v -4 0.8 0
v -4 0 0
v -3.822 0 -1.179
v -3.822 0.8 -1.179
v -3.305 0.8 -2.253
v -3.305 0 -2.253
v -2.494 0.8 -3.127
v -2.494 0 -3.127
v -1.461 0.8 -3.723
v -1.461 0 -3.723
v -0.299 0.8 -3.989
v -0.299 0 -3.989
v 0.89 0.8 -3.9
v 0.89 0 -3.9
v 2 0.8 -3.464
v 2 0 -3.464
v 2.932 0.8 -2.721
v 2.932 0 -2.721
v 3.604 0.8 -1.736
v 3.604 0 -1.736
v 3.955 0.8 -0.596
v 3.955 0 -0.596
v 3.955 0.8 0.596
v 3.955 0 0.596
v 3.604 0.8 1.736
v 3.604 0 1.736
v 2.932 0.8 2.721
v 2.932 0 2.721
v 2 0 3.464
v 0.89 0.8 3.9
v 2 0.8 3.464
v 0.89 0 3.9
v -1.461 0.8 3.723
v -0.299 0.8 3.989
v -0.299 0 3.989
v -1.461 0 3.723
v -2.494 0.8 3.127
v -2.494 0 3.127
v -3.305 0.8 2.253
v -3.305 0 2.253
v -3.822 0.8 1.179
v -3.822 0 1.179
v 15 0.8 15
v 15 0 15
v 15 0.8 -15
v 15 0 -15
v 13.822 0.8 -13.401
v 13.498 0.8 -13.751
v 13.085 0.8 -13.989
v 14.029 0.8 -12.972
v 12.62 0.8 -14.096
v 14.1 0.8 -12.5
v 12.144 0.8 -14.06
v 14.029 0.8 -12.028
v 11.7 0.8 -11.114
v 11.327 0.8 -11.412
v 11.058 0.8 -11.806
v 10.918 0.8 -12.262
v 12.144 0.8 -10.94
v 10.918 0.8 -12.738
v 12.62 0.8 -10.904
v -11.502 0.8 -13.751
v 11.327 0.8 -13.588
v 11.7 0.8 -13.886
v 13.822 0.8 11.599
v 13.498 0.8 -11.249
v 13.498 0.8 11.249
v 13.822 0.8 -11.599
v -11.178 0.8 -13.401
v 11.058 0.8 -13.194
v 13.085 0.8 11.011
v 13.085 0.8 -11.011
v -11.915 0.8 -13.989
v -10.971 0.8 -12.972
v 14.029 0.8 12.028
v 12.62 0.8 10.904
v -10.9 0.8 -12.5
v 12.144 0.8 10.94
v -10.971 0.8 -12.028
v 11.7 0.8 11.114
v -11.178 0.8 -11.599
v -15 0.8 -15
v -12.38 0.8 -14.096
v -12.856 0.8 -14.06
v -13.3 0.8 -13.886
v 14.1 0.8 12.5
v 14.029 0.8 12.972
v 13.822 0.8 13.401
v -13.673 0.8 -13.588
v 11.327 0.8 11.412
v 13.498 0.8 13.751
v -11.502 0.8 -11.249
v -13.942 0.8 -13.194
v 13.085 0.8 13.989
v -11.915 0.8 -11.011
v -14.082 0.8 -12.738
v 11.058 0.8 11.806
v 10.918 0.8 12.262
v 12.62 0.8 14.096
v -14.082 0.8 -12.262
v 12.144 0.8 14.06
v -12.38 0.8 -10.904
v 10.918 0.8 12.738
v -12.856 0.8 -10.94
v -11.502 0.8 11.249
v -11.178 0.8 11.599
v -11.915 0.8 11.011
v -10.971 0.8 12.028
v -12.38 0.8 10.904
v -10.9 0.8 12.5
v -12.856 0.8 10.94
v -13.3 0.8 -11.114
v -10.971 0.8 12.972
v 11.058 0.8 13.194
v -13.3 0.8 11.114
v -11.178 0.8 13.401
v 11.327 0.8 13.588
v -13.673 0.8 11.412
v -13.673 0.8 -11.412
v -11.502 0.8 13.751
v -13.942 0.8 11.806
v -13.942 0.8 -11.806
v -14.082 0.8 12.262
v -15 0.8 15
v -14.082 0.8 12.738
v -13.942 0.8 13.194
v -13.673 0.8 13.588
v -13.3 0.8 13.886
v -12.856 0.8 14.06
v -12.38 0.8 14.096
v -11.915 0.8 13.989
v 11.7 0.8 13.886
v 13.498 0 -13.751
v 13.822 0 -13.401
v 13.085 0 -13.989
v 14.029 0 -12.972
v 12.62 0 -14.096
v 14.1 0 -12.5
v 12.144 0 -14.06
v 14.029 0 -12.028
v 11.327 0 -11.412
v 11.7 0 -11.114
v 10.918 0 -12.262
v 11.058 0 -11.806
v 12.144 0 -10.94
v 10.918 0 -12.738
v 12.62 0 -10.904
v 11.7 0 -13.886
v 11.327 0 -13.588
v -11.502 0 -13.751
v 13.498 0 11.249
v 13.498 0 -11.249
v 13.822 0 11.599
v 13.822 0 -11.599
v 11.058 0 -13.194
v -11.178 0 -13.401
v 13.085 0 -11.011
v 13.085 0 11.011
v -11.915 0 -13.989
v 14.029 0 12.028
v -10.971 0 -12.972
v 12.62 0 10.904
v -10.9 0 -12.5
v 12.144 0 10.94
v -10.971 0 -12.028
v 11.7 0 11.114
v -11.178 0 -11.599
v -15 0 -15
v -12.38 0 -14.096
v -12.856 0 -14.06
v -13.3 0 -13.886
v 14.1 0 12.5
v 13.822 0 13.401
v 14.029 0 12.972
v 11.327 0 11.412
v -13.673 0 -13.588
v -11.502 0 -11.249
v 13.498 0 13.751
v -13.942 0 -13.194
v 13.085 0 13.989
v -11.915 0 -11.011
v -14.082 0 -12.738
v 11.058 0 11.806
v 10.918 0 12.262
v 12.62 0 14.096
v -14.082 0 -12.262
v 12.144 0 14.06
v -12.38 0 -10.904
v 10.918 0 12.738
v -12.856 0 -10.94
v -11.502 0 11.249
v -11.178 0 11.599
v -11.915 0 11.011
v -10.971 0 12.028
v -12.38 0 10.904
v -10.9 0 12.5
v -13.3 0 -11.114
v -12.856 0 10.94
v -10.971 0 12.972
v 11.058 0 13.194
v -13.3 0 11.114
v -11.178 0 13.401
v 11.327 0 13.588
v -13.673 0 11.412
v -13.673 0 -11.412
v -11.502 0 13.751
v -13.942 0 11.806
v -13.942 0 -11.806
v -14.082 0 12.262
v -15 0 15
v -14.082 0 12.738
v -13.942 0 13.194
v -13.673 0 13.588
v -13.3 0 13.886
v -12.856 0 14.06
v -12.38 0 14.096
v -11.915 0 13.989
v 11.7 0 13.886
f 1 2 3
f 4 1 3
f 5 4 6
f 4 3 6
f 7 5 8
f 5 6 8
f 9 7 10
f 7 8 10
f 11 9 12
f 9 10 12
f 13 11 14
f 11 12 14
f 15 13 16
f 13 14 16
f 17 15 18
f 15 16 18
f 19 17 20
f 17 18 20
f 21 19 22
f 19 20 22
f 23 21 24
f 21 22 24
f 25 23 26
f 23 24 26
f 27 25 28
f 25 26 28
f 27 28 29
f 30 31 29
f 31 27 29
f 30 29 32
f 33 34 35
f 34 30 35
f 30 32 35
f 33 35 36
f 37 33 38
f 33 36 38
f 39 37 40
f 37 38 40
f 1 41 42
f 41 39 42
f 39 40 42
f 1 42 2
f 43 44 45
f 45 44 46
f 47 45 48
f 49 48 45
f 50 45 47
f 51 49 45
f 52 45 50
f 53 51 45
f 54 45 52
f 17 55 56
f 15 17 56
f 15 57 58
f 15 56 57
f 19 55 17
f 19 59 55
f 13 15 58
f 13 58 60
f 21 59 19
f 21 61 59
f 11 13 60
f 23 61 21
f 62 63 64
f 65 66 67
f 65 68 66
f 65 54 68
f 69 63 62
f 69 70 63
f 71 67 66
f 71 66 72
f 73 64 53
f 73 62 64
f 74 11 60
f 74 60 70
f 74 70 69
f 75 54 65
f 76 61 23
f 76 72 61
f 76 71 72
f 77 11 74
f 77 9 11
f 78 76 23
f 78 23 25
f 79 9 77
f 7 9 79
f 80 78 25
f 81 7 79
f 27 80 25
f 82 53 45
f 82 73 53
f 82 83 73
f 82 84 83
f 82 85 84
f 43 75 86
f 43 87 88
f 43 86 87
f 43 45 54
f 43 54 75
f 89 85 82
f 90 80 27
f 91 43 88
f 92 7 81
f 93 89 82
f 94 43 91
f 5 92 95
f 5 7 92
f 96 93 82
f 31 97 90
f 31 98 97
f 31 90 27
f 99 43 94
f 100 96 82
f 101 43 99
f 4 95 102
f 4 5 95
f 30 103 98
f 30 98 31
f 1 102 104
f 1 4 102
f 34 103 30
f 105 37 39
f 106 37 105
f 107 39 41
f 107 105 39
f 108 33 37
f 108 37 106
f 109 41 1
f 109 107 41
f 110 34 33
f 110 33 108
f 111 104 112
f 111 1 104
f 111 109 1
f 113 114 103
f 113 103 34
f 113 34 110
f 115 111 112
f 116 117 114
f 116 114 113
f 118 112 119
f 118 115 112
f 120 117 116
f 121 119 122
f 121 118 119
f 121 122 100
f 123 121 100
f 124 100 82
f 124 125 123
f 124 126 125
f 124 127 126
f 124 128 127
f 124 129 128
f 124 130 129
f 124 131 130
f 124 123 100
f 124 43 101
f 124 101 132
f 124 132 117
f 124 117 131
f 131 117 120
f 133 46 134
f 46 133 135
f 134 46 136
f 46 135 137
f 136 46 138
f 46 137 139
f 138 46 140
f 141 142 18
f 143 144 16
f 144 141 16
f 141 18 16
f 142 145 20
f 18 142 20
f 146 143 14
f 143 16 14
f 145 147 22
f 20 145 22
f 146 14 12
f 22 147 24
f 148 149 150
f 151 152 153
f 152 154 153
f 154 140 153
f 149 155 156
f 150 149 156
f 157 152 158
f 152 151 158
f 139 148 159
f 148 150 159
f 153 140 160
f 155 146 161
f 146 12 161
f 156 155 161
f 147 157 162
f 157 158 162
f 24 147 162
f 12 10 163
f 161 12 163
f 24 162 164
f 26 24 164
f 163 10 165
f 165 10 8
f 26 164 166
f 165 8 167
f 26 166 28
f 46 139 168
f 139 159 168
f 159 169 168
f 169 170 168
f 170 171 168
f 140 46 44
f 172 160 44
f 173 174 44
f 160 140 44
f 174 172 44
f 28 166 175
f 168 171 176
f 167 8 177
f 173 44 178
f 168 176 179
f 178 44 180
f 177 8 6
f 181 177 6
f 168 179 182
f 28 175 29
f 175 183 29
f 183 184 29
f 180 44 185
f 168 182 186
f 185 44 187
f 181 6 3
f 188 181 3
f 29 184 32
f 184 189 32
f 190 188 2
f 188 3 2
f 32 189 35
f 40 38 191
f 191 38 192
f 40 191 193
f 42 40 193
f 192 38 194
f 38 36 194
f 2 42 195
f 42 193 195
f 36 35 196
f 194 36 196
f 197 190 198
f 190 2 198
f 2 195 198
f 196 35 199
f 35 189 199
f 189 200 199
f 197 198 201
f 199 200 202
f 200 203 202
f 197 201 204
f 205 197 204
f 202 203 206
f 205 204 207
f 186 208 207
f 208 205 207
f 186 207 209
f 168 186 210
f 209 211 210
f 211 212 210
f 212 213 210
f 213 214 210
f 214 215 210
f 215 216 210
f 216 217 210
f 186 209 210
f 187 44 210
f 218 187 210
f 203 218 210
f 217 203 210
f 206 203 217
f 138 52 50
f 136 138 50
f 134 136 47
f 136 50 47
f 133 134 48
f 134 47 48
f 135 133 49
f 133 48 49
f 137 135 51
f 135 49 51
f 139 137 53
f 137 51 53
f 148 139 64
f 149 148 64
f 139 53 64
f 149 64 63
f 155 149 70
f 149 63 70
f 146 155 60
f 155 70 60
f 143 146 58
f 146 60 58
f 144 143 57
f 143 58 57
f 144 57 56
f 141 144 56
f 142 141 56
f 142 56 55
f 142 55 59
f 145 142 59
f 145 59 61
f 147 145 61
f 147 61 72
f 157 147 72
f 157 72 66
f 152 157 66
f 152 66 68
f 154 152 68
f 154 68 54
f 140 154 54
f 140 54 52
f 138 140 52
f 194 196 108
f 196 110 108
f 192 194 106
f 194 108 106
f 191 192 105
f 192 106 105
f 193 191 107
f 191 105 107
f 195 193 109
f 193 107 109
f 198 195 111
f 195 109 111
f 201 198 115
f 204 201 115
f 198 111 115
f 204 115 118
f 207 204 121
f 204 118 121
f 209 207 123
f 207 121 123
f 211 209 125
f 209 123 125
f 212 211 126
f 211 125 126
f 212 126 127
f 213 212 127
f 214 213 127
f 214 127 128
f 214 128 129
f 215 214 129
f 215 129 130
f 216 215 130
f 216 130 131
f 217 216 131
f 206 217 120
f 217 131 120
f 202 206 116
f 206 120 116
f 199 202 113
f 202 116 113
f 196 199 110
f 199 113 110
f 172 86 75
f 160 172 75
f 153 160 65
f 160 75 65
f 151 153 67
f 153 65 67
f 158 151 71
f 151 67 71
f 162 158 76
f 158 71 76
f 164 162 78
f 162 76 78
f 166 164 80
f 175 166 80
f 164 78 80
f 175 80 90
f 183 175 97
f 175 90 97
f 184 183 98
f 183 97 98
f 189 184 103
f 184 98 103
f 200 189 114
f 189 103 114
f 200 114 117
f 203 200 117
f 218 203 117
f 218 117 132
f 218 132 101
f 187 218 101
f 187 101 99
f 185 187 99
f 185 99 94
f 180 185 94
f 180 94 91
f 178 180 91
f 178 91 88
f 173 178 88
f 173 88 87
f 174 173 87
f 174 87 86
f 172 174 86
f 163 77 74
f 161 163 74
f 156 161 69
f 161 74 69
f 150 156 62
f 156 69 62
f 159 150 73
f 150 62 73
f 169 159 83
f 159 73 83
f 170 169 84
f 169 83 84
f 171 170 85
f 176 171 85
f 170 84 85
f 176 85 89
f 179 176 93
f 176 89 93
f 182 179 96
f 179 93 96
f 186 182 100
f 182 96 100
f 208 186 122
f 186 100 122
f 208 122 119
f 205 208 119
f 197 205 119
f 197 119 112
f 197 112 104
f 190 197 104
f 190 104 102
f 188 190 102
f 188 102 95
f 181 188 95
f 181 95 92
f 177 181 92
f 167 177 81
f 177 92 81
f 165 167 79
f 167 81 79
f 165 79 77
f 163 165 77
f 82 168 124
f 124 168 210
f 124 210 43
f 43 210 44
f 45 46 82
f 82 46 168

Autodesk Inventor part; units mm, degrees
ref_plane "YZ Plane" through (0, 0, 0) normal (1, 0, 0) x (0, 1, 0)
ref_plane "XZ Plane" through (0, 0, 0) normal (0, 1, 0) x (-1, 0, 0)
ref_plane "XY Plane" through (0, 0, 0) normal (0, 0, 1) x (1, 0, 0)
sketch "スケッチ1" plane through (0, 0, 0) normal (0, 1, 0) x (-1, 0, 0)
  line L0 (-15, -15) -> (15, -15)
  line L1 (15, -15) -> (15, 15)
  line L2 (15, 15) -> (-15, 15)
  line L3 (-15, 15) -> (-15, -15)
  line L4 (-15, -15) -> (15, 15) construction
  line L5 (15, -15) -> (-15, 15) construction
  circle A0 centre (0, 0) radius 4
  dimension "d0" = 30
  dimension "d1" = 30
  dimension "d2" = 8
extrude "押し出し1" add sketch "スケッチ1" along normal blind 0.8
sketch "スケッチ2" plane through (0, 0.8, 0) normal (0, 1, 0) x (1, 0, 0)
  circle A0 centre (-12.5, -12.5) radius 1.6
  line L0 (0, -18.82) -> (0, 21.247)
  line L1 (-16.0432, 0) -> (16.9483, 0)
  circle A1 centre (-12.5, 12.5) radius 1.6
  circle A2 centre (12.5, -12.5) radius 1.6
  circle A3 centre (12.5, 12.5) radius 1.6
  line L2 (-15, 15) -> (-15, -15) projected
  line L3 (-15, -15) -> (15, -15) projected
  point P0 (0, 0)
  dimension "d5" = 3.2
  dimension "d10" = 25
  dimension "d13" = 25
  dimension "d18" = 2.5
  dimension "d19" = 2.5
extrude "押し出し2" cut sketch "スケッチ2" against normal through all contours A0 | A1 | A2 | A3
properties part number "Base"
